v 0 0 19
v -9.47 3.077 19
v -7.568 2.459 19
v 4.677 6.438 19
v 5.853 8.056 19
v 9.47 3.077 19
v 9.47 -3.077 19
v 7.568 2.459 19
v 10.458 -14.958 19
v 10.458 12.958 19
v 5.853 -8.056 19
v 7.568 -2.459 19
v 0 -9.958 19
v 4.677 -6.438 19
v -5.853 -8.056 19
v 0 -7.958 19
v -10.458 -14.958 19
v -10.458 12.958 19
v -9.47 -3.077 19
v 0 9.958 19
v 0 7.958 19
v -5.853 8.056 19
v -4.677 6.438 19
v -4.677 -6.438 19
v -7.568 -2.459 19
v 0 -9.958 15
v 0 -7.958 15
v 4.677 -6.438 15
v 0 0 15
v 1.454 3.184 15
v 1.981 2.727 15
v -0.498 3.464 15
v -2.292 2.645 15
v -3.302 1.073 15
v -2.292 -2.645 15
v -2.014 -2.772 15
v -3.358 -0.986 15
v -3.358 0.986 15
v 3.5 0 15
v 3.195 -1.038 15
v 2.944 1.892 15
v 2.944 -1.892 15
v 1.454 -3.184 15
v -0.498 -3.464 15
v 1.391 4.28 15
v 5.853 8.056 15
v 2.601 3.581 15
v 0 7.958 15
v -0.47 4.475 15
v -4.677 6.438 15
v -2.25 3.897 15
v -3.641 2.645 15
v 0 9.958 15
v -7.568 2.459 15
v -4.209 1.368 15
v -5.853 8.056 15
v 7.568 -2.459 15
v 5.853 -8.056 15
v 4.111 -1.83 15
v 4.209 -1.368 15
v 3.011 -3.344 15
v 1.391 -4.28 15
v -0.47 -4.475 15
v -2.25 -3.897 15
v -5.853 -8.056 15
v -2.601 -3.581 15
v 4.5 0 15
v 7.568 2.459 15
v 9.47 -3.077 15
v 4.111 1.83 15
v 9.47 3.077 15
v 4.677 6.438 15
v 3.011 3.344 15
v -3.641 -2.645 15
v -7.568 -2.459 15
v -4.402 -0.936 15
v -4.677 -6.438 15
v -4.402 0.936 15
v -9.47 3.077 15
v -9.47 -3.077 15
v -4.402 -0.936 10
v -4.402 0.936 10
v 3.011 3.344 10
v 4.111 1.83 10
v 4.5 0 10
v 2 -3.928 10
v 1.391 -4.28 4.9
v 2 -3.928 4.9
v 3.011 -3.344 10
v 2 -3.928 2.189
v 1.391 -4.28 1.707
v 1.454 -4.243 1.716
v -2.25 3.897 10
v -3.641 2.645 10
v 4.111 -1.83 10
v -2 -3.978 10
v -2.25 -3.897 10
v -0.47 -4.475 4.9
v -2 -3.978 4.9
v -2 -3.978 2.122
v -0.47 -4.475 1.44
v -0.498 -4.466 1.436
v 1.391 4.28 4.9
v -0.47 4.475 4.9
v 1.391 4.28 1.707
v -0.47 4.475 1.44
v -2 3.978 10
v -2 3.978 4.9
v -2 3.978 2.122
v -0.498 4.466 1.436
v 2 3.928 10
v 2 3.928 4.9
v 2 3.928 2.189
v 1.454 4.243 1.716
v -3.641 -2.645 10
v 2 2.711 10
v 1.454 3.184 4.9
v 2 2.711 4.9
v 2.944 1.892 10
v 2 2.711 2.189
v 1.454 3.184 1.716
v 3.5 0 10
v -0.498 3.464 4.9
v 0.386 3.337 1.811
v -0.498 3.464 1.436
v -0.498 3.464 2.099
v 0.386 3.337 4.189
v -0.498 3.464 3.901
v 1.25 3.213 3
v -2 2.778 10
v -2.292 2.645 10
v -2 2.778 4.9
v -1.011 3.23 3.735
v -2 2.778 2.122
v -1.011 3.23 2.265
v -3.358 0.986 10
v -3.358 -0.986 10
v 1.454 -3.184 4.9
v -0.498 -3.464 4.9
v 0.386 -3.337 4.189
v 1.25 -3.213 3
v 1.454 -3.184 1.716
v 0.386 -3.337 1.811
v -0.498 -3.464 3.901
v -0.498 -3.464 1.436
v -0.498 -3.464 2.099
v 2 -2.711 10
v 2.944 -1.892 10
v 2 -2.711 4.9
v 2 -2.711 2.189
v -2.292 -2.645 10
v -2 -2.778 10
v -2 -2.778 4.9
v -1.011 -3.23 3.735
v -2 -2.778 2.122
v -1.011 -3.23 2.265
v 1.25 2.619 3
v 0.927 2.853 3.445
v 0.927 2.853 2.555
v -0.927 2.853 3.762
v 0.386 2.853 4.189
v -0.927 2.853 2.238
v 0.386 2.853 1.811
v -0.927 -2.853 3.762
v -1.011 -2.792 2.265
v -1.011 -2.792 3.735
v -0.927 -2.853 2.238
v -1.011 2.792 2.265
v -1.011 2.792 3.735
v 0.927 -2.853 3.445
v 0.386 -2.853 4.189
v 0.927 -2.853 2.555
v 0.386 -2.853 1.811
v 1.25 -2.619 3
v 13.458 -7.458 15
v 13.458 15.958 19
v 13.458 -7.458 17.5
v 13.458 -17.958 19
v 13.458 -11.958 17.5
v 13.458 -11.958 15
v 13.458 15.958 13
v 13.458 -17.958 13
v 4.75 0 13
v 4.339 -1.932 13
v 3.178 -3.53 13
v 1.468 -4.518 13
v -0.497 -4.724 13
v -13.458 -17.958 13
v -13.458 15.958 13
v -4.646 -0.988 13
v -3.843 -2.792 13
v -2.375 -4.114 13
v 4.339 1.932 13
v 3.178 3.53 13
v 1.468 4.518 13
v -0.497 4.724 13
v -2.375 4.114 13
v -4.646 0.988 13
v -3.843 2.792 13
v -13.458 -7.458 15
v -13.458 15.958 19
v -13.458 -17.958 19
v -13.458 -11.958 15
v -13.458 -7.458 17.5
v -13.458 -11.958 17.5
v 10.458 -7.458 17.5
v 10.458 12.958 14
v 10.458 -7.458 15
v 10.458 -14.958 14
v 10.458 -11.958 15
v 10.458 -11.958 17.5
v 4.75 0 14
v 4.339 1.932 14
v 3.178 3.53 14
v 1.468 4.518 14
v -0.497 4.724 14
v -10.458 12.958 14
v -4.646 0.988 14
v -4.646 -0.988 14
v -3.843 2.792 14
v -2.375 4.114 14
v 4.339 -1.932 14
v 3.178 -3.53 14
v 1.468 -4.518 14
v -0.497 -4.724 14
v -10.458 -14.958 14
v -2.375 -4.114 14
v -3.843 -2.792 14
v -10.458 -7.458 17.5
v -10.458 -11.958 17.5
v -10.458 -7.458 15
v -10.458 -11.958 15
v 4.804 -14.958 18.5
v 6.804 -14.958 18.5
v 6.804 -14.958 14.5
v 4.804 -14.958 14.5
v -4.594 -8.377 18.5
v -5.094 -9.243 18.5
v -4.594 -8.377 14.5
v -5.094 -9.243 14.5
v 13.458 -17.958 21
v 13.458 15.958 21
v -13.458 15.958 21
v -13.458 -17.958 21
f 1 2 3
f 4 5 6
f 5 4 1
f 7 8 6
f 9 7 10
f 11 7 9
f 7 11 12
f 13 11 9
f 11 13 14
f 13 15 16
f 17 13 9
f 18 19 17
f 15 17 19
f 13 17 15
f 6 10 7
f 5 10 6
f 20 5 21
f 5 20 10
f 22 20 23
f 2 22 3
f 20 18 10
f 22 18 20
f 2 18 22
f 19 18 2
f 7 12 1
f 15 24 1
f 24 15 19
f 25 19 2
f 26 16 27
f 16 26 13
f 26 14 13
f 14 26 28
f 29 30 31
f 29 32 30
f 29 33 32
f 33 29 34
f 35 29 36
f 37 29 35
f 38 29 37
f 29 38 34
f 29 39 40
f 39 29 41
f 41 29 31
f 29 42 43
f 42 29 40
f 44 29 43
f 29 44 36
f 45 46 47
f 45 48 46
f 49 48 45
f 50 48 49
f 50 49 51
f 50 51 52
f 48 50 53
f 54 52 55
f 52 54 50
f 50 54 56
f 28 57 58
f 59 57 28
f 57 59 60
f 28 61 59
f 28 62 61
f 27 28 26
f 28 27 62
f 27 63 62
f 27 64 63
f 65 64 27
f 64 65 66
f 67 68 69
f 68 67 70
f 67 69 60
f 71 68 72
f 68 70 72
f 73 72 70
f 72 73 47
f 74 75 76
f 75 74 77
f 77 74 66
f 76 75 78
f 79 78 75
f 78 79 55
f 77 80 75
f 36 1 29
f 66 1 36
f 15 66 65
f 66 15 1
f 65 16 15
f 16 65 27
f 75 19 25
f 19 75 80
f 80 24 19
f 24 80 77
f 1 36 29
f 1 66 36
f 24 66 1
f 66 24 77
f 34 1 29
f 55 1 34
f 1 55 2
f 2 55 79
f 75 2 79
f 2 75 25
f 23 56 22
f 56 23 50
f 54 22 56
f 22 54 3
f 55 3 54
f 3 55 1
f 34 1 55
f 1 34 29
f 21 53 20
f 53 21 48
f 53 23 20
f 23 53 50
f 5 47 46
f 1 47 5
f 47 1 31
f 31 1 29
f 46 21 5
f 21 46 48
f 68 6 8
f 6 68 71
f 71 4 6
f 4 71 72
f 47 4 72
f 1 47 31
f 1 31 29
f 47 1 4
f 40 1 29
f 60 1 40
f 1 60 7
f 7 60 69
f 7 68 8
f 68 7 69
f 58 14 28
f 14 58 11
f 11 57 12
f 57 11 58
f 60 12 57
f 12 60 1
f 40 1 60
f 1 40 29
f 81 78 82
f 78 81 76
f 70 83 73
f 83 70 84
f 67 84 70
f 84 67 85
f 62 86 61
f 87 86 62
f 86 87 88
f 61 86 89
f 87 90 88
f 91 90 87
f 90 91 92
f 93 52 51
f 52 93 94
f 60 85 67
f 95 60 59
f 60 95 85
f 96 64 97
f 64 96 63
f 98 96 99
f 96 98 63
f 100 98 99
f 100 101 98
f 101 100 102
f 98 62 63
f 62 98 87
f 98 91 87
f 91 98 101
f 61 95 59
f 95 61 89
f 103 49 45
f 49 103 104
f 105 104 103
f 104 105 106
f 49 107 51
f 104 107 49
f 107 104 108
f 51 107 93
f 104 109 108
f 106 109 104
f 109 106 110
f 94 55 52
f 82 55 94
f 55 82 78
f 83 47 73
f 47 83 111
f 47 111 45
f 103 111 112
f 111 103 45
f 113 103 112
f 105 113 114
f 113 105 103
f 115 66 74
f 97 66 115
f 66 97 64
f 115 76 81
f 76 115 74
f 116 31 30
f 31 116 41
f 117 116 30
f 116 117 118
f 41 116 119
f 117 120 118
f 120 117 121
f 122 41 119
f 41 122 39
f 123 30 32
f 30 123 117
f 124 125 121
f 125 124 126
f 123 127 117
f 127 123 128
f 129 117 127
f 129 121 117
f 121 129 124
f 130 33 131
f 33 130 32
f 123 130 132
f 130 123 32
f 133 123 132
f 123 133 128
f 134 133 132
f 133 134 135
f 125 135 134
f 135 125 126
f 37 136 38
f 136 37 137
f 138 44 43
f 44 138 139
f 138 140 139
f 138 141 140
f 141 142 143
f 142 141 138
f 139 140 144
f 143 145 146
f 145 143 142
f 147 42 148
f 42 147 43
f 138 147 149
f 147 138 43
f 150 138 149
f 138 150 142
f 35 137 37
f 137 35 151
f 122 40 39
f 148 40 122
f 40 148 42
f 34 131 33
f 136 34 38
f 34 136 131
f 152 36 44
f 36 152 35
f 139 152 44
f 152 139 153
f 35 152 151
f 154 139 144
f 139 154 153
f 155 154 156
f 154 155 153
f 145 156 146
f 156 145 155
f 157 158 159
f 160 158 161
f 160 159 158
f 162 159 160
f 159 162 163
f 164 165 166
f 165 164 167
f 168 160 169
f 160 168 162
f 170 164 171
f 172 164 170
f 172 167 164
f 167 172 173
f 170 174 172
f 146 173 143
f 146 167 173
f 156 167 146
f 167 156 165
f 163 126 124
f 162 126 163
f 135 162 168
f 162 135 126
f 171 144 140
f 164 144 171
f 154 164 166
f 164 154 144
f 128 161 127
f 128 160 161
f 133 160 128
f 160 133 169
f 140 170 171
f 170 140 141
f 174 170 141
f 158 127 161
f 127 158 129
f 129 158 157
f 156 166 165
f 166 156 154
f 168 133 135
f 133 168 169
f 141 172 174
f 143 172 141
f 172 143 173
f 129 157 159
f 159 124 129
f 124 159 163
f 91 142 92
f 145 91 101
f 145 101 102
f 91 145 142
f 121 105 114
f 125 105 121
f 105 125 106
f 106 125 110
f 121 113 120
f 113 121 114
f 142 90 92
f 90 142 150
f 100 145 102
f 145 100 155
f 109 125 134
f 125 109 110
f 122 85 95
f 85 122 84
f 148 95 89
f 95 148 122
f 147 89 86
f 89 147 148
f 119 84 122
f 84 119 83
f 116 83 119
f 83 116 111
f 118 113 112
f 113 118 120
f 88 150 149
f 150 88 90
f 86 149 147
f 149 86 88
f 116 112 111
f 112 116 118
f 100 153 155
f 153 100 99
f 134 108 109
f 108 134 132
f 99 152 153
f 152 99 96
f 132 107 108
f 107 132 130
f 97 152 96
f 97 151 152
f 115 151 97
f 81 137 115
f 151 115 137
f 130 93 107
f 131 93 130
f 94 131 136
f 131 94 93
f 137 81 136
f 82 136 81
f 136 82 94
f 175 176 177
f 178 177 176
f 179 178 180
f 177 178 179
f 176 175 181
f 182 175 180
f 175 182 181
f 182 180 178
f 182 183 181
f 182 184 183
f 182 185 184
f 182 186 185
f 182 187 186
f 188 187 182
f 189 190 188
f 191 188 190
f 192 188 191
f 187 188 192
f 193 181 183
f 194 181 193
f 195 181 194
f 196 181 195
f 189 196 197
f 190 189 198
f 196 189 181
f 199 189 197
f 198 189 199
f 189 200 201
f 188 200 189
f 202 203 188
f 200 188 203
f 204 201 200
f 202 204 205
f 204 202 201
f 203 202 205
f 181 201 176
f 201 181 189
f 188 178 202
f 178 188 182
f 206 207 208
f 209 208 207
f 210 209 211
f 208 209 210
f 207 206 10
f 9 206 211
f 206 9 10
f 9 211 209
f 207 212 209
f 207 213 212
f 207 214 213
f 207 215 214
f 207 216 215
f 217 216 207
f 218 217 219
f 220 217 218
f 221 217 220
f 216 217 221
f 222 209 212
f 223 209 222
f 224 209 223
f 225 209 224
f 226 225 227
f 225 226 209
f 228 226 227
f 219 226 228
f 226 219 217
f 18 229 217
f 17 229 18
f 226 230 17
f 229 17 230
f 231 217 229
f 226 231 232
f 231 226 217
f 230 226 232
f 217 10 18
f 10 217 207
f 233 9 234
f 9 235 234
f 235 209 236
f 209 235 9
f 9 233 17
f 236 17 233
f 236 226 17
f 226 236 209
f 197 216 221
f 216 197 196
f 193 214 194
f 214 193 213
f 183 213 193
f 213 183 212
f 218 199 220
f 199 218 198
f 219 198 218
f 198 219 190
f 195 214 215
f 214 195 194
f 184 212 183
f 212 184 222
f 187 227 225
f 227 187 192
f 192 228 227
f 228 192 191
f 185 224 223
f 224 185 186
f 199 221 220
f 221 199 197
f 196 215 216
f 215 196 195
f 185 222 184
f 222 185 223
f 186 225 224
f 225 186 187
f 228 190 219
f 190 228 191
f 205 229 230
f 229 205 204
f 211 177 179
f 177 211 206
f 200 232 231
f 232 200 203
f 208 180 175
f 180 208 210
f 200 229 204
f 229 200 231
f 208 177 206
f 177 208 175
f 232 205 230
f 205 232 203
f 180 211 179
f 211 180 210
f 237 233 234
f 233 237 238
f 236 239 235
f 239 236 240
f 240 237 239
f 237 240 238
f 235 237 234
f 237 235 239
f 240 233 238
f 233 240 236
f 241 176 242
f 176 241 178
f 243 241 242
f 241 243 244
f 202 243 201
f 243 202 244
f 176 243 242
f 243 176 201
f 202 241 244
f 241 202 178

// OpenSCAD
// file: lib/openscad-lib/prism.scad
module prism(points, height) {
    top_points = [ for (p = points) [p[0], p[1], height] ];
    
    points = concat(points, top_points);
    vertices = len(points);
    sides_count = vertices / 2;
    faces = concat(
        [[ for (i = [0:sides_count - 1]) i ]],
        [ for (i = [0:sides_count - 1]) 
            [
                (i + sides_count) % vertices,
                i == sides_count - 1 ? i + 1 : (i + sides_count + 1) % vertices,
                i != sides_count - 1 ? i + 1 : (i + sides_count + 1) % vertices,
                i,
            ]
        ],
        [[ for (i = [vertices - 1:-1:sides_count]) i ]]
    );

    polyhedron(points, faces);
}

module regular_prism(
    sides_count,
    radius = 0,
    sides_length,
    height,
) {
    radius = radius != 0 ? radius : (sides_length / (2 * sin(180 / sides_count)));
    angles = [ for (i = [0:sides_count - 1]) i * (360 / sides_count) ];
    
    base_points = [ for (i = angles) [radius * cos(i), radius * sin(i), 0] ];

    prism(points = base_points, height = height);
}
// file: lib/openscad-lib/gears.scad
use <prism.scad>

module ratchet_gear(
    thickness,
    inner_diameter,
    teeth_length,
    teeth_count,
) {
    inner_radius = inner_diameter / 2;
    angle = 360 / teeth_count;
    angles = [ for (i = [0:angle:360]) i ];

    for (i = [0:teeth_count - 1]) {
        rotate(i * (360 / teeth_count))
        prism(
            [
                [0, 0],
                [0, teeth_length + inner_radius],
                [inner_radius * sin(angle), inner_radius * cos(angle)],
            ],
            thickness
        );
    }
}

module ratchet_stick_pawl(
    thickness,
    length,
    inner_width,
    teeth_length,
    teeth_count,
) {
    teeth_base = length / teeth_count;

    cube([length, inner_width, thickness]);
    translate([0, inner_width])
    for (i = [0:teeth_count - 1]) {
        translate([i * teeth_base, 0])
        prism(
            [
                [0, 0],
                [teeth_base, 0],
                [teeth_base, teeth_length],
            ],
            thickness
        );
    }
}
// main file
use <lib/openscad-lib/gears.scad>

thickness = 2;

mount_diameter = 9;
mount_height = 15;

gear_height = thickness * 2;
gear_inner_diameter = 50 / PI;
gear_outer_diameter = gear_inner_diameter + (2 * thickness);

housing_inner_length = gear_outer_diameter + 1;
housing_inner_width = gear_outer_diameter + 8;
housing_outer_length = housing_inner_length + (thickness * 3);
housing_outer_width = housing_inner_width + (thickness * 3);
housing_length_thickness = (housing_outer_length - housing_inner_length) / 2;
housing_width_thickness = (housing_outer_width - housing_inner_width) / 2;
housing_y = (gear_outer_diameter / 2) - housing_inner_width;

total_height = gear_height + thickness;

module main_gear() {
    translate([0, 0, gear_height + mount_height]) 
    rotate(180, [1, 0])
    ratchet_gear(gear_height, gear_inner_diameter, thickness, 10);
    difference() {
        union() {
            difference() {
                cylinder(mount_height, d = mount_diameter);
                cylinder(mount_height, d = mount_diameter - 2);
            }
            intersection() {
                difference() {
                    cylinder(mount_height, d = mount_diameter);
                    cylinder(mount_height, d = mount_diameter - 3);
                }
                translate([0, 15, 3])
                rotate(90, [1, 0])
                cylinder(30, d = 2.5);
            }
        }
        translate([0, 5, 4.9])
        rotate(90, [1, 0])
        difference() {
            translate([-5, -5])
            cube([10, 5, 10]);
            difference() {
                cylinder(10, d = 7);
                translate([-5, 0])
                cube([10, 5, 10]);
            }
        }
        translate([0, -5]) {
            translate([2, 0])
            cube(10);
            translate([-12, 0])
            cube(10);
        }
    }
}

module housing_pins() {
    translate([0, housing_y]) {
        translate([0, housing_width_thickness / 2]) {
            translate([(housing_inner_length + housing_length_thickness) / 2, 0])
            cylinder(total_height + 1, d = 2);
            translate([-(housing_inner_length + housing_length_thickness) / 2, 0])
            cylinder(total_height + 1, d = 2);
        }
        translate([0, (housing_width_thickness * 1.5) + housing_inner_width]) {
            translate([(housing_inner_length + housing_length_thickness) / 2, 0])
            cylinder(total_height + 1, d = 2);
            translate([-(housing_inner_length + housing_length_thickness) / 2, 0])
            cylinder(total_height + 1, d = 2);
       }
    }
}

module bottom_housing() {
    spring_angle = 30;
    spring_length = housing_inner_length / 1.2;

    difference() {
        translate([-housing_outer_length / 2, housing_y])
        difference() {
            cube([housing_outer_length, housing_outer_width, total_height]);
            translate([housing_length_thickness, housing_width_thickness, thickness / 2])
            cube([housing_inner_length, housing_inner_width, total_height]);
        }
        translate([0, 0, -5])
        cylinder(10, d = mount_diameter + 0.5);
        translate([(-housing_outer_length / 2) - 0.5, -((gear_outer_diameter / 2) + thickness), thickness])
        cube([housing_outer_length + 1, (thickness * 2) + 0.5, thickness + 0.5]);
        housing_pins();
    }
    translate([10, housing_y, (thickness / 2) + 0.5])
    rotate(-spring_angle)
    translate([-spring_length, 0])
    cube([spring_length, 1, gear_height]);
}

module top_housing() {
    translate([-housing_outer_length / 2, housing_y, total_height])
    cube([housing_outer_length, housing_outer_width, thickness]);
    housing_pins();
}

module launcher() {
    main_gear();
    translate([0, 0, mount_height - (gear_height / 2)]) {
        bottom_housing();
        top_housing();
    }
}

render()
launcher();
